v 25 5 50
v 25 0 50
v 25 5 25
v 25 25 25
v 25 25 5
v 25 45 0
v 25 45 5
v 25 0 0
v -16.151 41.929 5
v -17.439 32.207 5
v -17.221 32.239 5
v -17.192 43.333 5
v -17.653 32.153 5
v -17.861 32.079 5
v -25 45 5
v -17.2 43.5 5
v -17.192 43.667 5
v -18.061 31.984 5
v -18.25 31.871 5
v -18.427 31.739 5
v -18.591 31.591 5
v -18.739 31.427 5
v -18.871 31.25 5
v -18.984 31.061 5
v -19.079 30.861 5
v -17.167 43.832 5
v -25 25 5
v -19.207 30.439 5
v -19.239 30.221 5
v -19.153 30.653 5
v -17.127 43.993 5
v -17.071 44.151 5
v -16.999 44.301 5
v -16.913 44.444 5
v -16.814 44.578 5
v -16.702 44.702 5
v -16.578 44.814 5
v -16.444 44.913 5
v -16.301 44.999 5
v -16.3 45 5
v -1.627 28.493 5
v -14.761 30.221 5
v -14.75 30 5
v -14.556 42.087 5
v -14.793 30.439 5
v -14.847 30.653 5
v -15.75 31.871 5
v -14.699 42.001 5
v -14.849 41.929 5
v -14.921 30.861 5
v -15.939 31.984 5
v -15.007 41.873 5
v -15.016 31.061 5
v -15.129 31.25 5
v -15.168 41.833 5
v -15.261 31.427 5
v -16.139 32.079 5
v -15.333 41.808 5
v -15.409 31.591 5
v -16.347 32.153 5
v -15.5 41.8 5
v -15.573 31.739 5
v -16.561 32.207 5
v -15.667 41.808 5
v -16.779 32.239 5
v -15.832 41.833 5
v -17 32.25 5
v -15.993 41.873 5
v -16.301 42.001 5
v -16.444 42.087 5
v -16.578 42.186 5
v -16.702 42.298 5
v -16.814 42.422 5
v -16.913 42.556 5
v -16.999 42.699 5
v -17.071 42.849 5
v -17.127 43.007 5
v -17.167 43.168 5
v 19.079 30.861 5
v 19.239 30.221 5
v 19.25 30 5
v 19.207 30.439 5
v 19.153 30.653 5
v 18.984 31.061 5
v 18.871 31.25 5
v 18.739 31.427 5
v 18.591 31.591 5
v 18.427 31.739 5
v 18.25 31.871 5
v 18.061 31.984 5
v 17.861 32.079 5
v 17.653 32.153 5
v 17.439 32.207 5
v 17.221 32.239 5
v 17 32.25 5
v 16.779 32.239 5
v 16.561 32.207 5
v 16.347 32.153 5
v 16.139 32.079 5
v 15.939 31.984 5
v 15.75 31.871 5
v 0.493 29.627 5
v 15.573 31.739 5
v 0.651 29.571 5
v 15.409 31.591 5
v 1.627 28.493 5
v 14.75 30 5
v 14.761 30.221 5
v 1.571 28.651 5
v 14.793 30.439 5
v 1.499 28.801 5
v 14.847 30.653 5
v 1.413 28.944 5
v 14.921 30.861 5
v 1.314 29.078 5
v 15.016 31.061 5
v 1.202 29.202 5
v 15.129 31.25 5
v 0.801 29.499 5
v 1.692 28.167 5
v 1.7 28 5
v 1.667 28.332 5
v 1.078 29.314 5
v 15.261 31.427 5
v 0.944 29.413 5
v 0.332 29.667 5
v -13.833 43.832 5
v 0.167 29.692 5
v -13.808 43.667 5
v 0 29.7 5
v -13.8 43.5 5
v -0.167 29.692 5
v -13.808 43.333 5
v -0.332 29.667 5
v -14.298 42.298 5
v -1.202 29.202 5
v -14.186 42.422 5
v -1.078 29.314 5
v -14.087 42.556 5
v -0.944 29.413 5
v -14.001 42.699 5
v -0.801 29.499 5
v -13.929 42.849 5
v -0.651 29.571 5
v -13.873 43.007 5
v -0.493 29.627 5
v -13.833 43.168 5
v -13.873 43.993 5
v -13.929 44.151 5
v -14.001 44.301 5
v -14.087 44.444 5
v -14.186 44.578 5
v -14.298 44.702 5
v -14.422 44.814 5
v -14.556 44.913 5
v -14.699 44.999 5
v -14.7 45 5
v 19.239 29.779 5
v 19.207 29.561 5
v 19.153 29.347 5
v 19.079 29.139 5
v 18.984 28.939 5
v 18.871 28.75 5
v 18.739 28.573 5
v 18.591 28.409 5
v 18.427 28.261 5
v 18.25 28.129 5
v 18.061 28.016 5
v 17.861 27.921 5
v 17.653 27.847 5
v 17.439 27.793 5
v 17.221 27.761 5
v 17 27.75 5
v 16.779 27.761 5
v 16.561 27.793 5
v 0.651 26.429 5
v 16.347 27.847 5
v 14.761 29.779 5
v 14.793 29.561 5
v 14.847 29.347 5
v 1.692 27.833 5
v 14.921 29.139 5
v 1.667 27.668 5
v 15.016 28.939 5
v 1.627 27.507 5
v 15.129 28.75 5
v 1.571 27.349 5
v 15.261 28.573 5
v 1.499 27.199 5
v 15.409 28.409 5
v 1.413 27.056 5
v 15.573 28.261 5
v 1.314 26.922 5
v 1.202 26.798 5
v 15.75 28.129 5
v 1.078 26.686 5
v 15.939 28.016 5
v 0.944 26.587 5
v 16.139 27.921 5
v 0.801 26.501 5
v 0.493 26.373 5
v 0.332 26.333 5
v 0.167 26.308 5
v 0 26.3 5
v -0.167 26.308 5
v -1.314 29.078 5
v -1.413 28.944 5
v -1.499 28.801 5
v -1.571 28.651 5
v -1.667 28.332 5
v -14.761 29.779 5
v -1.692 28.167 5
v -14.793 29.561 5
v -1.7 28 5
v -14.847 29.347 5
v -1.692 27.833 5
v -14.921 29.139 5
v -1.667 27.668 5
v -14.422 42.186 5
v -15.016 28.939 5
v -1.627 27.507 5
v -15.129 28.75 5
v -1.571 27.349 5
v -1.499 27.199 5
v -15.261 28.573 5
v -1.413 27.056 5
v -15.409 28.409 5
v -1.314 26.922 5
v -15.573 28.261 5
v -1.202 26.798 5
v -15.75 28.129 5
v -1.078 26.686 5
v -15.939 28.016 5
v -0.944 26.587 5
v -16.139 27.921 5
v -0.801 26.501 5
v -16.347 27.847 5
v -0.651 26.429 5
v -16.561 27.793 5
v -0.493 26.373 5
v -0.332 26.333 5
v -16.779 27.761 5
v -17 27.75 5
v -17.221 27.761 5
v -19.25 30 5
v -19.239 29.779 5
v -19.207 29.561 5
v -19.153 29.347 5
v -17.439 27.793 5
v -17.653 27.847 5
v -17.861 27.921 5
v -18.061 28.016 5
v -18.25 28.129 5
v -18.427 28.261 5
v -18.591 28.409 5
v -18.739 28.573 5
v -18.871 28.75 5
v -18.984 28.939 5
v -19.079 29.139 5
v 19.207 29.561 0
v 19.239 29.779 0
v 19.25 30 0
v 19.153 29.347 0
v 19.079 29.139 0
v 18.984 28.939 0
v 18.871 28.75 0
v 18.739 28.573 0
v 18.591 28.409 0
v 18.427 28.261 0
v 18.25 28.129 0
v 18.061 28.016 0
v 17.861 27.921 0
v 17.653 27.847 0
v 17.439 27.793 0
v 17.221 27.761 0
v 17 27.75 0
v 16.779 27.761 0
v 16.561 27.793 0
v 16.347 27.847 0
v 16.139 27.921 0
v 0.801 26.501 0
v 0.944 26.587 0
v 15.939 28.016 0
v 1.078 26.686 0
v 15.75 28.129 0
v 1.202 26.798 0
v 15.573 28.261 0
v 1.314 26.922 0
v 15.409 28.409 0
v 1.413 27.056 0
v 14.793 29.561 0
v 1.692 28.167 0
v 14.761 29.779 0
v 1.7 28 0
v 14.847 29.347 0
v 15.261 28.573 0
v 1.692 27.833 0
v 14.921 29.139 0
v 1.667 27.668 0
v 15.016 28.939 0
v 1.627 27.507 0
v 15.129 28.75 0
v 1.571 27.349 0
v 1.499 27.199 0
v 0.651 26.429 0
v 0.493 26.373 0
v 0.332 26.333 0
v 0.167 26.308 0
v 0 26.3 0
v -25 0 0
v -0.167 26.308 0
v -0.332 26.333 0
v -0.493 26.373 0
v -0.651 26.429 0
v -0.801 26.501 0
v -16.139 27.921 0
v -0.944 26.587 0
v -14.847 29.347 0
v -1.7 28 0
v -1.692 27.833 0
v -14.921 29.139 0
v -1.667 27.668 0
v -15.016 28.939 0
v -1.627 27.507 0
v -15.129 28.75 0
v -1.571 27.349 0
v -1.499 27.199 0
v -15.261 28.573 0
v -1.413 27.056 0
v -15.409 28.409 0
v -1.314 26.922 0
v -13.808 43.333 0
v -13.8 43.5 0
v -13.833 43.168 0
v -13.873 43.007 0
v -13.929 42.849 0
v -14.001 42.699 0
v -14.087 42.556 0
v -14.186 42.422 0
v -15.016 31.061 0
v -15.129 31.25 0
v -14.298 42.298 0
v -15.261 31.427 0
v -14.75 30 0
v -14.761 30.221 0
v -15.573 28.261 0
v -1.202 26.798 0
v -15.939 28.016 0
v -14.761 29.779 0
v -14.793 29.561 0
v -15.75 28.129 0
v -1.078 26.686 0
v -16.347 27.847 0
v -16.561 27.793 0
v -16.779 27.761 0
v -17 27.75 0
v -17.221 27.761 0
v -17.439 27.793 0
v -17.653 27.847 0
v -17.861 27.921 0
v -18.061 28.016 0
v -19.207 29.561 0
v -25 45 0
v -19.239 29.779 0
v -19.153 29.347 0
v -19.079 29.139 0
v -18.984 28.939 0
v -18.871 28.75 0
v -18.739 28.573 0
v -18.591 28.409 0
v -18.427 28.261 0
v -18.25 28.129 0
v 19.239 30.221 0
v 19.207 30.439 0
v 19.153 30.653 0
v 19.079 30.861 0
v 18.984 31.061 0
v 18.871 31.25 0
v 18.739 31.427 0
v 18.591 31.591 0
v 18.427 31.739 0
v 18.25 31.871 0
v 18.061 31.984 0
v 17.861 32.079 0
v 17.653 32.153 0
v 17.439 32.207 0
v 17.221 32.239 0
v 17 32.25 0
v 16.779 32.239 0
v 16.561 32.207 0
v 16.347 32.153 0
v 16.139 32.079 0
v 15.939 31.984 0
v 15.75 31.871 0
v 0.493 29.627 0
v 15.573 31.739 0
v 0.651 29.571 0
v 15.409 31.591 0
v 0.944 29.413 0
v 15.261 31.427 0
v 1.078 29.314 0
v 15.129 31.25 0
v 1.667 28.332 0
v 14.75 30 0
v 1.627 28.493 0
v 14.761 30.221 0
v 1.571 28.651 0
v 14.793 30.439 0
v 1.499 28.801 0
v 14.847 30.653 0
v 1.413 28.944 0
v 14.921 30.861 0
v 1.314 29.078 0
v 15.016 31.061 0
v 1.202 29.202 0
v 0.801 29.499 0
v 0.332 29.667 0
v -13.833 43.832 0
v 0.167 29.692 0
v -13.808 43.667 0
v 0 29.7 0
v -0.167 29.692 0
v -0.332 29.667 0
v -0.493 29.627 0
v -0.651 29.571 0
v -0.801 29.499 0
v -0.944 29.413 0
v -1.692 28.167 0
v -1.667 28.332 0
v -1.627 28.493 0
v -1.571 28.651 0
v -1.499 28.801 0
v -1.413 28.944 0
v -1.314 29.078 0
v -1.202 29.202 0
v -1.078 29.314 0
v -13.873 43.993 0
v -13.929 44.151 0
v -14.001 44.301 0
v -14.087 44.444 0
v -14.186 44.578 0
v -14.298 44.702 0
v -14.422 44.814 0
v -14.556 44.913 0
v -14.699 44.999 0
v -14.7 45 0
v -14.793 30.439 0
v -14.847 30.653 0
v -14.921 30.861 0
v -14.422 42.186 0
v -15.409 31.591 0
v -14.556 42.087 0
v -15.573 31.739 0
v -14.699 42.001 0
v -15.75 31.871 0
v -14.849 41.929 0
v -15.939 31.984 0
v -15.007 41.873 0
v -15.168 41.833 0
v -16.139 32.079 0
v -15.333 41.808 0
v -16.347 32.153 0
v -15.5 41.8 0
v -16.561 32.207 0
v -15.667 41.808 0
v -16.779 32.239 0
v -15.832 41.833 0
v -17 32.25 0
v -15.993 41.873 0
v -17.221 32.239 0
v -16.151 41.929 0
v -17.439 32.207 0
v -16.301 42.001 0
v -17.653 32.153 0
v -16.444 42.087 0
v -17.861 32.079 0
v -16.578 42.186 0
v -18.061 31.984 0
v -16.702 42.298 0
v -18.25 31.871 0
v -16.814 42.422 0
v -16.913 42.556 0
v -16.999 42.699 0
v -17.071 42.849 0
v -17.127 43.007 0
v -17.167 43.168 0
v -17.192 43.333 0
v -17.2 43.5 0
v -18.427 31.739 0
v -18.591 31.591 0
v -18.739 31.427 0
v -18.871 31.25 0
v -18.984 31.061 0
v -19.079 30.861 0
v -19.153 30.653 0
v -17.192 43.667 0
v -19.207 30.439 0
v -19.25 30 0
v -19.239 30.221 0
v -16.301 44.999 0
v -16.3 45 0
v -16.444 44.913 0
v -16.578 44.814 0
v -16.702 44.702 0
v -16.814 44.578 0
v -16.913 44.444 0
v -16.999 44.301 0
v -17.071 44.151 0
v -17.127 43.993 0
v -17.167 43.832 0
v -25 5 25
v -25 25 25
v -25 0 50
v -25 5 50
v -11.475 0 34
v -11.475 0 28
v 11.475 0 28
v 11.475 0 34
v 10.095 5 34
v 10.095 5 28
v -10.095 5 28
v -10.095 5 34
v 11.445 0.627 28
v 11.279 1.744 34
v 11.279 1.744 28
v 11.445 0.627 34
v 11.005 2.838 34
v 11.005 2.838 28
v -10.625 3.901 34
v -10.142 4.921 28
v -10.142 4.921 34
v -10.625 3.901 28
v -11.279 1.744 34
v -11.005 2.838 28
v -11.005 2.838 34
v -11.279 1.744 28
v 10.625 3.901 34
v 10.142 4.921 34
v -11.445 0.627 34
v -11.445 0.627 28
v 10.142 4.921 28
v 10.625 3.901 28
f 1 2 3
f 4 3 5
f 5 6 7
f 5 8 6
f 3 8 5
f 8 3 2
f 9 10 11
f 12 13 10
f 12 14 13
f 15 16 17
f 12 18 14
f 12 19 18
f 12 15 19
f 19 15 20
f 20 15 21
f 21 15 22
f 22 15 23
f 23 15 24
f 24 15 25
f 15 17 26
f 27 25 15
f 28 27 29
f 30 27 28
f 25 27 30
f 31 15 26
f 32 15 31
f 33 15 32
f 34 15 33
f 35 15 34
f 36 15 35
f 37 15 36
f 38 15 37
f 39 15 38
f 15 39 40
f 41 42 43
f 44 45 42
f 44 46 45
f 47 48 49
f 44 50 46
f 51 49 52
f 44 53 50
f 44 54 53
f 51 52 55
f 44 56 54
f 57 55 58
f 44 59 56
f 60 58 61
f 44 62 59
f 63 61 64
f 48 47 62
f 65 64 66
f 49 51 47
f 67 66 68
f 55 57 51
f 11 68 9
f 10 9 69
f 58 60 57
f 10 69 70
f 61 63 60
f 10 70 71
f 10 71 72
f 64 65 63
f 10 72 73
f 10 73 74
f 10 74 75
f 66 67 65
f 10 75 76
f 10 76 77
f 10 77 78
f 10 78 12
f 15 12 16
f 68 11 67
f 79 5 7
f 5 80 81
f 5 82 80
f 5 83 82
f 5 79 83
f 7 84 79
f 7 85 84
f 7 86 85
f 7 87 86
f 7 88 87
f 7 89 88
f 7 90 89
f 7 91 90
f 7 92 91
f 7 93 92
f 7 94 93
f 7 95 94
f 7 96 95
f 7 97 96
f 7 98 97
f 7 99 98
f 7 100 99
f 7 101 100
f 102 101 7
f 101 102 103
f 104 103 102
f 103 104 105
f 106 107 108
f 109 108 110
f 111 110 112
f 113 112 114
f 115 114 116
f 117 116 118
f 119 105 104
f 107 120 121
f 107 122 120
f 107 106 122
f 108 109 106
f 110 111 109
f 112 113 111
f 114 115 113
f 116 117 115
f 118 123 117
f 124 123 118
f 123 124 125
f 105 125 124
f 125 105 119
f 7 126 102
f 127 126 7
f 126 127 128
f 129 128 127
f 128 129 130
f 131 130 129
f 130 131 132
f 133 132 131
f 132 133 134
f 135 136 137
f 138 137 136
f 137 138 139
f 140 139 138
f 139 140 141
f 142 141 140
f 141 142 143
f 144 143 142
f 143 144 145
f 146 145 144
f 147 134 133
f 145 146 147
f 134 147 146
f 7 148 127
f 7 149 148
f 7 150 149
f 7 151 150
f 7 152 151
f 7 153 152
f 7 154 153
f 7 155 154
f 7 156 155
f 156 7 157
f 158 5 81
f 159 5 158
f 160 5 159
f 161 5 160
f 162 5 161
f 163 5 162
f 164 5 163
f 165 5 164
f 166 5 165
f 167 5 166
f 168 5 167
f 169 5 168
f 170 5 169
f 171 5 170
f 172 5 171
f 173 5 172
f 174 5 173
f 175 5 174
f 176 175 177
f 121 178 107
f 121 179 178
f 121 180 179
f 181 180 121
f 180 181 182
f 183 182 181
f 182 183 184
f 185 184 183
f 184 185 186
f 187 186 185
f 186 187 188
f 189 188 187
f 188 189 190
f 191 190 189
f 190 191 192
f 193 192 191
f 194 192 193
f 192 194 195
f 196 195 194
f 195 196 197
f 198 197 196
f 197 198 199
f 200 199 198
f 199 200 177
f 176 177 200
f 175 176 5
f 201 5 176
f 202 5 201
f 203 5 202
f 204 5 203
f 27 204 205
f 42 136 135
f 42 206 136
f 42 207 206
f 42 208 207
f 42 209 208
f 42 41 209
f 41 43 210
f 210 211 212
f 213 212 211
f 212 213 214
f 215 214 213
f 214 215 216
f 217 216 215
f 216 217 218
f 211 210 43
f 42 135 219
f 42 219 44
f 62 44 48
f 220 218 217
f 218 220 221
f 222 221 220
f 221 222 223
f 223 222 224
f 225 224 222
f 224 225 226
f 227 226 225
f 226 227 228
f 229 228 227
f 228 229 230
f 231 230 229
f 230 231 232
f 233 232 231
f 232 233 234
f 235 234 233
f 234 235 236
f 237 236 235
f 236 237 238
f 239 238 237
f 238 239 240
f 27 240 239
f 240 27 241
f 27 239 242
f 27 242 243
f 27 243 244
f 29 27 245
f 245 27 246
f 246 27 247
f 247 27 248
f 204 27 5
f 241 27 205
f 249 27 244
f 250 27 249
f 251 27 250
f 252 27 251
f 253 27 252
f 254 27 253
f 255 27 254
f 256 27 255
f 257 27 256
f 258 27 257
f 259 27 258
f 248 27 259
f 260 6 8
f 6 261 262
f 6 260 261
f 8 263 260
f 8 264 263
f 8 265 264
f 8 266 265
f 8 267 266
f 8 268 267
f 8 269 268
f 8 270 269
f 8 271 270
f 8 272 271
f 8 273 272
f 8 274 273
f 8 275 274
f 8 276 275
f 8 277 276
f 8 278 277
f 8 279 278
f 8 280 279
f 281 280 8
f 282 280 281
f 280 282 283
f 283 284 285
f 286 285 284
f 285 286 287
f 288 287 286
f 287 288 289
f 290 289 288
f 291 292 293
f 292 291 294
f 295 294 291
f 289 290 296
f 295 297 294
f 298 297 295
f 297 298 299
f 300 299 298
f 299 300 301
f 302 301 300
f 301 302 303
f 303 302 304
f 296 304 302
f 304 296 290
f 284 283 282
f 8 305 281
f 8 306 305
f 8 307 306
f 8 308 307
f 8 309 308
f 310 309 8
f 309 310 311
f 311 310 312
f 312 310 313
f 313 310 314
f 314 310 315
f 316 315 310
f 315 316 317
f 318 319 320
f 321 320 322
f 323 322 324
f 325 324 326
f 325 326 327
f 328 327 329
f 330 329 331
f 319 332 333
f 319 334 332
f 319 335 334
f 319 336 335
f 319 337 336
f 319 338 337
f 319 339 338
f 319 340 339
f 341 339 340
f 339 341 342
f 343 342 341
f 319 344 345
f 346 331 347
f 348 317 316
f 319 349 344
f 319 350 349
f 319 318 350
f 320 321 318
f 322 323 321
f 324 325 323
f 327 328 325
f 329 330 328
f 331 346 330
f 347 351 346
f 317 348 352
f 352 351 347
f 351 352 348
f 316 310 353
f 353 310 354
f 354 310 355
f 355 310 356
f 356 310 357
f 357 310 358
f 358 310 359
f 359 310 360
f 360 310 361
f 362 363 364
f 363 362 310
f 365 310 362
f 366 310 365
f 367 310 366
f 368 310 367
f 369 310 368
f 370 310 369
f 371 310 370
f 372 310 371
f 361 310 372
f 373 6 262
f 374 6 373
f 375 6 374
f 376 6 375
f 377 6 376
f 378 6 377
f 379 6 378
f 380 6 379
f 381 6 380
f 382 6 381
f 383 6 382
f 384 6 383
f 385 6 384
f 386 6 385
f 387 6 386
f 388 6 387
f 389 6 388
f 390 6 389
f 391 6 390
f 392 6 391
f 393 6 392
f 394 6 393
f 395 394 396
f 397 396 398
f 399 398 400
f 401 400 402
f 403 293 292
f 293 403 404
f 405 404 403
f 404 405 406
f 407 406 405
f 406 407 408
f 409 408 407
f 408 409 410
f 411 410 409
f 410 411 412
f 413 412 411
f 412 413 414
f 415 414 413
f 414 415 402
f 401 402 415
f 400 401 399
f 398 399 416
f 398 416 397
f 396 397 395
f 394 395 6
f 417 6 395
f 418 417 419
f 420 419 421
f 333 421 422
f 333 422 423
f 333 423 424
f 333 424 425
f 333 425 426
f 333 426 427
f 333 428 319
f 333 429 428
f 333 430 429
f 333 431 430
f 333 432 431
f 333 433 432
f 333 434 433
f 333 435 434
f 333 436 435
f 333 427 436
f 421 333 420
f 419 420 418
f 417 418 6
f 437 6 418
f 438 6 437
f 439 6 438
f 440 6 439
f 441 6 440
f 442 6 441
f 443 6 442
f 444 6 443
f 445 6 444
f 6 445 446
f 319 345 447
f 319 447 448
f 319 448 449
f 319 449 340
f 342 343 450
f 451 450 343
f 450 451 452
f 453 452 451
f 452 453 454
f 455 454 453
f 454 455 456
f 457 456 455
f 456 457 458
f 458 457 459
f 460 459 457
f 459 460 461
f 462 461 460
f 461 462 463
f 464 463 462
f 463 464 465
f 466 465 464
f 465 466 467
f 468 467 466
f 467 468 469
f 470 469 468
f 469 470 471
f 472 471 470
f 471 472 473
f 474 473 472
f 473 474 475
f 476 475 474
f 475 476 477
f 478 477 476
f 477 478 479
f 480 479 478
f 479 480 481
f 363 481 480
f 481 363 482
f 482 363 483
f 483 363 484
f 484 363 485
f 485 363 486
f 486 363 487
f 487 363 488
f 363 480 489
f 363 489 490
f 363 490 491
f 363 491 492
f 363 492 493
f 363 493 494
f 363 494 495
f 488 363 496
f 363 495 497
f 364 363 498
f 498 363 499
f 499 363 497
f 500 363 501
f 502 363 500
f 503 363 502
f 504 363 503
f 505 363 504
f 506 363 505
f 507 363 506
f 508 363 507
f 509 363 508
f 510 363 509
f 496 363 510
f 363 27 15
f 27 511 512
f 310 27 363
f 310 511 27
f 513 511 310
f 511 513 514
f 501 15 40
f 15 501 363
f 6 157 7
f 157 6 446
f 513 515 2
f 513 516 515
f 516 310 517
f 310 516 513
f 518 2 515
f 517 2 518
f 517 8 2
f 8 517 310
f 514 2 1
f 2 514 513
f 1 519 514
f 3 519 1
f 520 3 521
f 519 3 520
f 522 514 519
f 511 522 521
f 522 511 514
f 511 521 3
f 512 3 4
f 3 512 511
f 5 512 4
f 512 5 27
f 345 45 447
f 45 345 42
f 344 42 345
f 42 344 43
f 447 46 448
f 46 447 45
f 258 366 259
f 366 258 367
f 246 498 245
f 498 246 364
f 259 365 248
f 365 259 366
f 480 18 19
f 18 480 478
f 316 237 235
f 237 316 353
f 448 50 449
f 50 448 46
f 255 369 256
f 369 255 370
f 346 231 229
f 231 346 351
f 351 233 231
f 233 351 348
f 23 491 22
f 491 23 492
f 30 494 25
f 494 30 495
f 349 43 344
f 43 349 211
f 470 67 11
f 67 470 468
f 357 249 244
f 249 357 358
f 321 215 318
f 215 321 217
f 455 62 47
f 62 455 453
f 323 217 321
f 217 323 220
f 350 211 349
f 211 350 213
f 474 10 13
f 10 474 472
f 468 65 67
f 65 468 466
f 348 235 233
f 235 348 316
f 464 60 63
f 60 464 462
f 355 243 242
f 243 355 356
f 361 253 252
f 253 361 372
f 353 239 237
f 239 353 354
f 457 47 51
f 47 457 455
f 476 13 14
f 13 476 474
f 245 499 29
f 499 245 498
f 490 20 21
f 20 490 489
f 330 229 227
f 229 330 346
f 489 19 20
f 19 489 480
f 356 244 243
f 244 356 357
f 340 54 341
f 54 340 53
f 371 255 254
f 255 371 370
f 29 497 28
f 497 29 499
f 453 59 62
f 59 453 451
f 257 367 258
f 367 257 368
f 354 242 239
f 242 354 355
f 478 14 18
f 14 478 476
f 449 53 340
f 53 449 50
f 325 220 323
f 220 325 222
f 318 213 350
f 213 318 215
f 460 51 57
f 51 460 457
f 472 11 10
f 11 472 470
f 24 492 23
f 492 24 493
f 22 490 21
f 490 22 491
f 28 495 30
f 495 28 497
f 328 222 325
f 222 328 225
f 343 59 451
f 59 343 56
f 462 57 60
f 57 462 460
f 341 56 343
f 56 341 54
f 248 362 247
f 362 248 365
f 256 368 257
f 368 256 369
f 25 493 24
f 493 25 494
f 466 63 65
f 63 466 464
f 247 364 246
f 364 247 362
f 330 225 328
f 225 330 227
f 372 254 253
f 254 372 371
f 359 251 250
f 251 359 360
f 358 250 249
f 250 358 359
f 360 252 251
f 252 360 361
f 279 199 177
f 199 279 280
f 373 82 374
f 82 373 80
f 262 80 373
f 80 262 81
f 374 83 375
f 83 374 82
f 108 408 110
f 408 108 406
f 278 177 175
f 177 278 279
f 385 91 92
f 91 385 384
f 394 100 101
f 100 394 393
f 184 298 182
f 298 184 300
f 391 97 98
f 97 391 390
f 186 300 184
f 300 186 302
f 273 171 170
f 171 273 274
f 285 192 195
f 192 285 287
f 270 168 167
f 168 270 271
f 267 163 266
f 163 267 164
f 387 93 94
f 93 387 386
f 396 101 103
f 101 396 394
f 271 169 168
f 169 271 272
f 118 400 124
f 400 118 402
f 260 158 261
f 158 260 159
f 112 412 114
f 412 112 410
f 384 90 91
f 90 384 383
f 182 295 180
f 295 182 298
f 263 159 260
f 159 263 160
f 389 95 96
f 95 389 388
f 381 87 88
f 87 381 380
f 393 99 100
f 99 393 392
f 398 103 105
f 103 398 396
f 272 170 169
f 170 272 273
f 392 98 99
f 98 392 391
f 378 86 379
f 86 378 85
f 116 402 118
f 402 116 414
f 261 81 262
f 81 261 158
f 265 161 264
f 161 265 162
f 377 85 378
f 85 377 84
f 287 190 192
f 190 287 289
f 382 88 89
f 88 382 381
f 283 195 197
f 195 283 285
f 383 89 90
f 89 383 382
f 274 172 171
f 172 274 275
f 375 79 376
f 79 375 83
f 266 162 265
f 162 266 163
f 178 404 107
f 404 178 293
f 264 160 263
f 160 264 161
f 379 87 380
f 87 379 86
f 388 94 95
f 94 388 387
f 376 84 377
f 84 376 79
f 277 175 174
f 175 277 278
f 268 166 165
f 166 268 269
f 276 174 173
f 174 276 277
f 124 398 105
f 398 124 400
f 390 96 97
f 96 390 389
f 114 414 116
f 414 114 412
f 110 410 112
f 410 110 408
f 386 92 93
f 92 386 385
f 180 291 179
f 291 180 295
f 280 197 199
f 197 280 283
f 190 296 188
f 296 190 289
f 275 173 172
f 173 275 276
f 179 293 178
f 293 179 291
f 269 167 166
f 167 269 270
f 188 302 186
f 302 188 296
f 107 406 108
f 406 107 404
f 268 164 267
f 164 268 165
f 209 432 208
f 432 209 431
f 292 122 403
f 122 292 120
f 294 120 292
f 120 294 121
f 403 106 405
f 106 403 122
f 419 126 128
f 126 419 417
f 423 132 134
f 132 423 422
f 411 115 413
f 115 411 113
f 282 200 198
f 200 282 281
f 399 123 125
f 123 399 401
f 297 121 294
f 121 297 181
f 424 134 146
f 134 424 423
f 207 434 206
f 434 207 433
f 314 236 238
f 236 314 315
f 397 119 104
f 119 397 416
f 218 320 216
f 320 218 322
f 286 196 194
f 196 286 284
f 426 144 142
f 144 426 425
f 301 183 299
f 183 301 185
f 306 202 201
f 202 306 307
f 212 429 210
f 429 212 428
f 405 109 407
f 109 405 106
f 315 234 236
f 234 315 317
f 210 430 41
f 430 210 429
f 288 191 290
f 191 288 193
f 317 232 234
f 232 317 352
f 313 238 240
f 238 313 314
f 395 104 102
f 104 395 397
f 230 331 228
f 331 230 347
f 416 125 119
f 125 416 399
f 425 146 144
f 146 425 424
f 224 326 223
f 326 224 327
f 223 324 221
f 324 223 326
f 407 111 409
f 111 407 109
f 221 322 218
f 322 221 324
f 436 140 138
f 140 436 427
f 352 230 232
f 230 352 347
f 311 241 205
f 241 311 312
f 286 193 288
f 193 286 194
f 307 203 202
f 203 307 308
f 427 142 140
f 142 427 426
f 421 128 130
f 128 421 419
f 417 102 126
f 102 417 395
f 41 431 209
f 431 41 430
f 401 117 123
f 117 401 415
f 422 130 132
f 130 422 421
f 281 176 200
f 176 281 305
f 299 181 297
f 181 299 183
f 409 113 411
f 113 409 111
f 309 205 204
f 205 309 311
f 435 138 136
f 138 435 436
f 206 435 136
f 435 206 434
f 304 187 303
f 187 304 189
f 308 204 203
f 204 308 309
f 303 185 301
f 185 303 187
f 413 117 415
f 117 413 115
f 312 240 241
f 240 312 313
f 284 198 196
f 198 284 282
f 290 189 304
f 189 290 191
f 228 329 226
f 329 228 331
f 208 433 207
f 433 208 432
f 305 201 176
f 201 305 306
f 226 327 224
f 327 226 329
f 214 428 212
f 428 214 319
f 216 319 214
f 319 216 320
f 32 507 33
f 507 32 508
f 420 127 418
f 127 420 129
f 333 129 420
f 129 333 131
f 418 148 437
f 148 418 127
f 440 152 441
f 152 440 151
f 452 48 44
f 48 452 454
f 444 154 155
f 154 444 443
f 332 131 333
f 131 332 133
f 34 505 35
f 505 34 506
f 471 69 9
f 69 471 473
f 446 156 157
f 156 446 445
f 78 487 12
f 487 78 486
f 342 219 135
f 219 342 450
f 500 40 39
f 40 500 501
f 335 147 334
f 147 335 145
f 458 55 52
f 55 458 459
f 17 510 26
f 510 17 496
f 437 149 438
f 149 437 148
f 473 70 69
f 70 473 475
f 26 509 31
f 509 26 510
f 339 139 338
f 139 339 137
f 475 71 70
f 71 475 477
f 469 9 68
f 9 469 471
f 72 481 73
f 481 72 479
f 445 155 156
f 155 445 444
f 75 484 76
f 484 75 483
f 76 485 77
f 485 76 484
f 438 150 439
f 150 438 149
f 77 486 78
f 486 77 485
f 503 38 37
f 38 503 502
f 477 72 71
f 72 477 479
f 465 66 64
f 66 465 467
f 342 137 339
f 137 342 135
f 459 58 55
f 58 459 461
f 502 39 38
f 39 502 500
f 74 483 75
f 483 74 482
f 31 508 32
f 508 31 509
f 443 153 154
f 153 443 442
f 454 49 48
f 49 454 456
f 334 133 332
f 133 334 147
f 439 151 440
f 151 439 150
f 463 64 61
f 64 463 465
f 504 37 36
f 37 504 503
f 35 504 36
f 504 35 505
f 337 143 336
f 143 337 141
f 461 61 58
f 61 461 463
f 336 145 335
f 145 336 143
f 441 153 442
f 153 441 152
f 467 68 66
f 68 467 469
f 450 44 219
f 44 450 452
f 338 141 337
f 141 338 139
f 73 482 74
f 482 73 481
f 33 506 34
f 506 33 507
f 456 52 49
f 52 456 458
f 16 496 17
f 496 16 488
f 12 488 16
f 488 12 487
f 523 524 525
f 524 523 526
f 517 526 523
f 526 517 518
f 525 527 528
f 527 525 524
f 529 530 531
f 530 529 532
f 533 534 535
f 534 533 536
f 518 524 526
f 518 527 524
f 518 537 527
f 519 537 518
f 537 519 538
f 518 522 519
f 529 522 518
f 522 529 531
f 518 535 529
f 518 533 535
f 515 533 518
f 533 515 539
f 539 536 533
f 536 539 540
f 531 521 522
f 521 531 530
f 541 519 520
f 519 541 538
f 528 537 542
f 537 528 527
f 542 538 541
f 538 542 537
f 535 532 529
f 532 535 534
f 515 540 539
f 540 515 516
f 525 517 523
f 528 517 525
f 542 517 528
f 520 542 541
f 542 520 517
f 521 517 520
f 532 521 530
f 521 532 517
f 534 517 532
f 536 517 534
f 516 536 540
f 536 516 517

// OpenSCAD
// L-shaped mounting bracket for a NEMA 17 stepper motor (e.g. syringe pump)
// Print orientation: base plate lies on the bed (z = 0), vertical plate builds up along +Z

$fn = 64;

// ---------- Base plate ----------
base_x_min   = -25;   // base plate X start
base_x_max   = 25;    // base plate X end
base_y_min   = 0;     // base plate Y start
base_y_max   = 45;    // base plate Y end
base_thick   = 5;     // base plate thickness (Z)

// ---------- Vertical motor plate ----------
vert_x_min   = -25;   // motor plate X start
vert_x_max   = 25;    // motor plate X end
vert_y_min   = 0;     // motor plate Y start
vert_y_max   = 5;     // motor plate Y end (thickness)
vert_height  = 50;    // motor plate height (Z)

// ---------- Boss hole ----------
boss_d       = 23;    // motor centring boss hole diameter
boss_x       = 0;     // boss hole X centre
boss_z       = 28;    // boss hole Z centre

// ---------- Screw holes ----------
screw_d      = 3.4;   // M3 screw hole diameter
screw_pitch  = 31;    // square pattern pitch (X and Y)
screw_n      = 4;     // number of screw holes

// ---------- Gussets ----------
gusset_x1    = -25;   // left gusset X start
gusset_x2    = -20;   // left gusset X end
gusset_y     = 20;    // gusset leg length along +Y
gusset_z     = 20;    // gusset leg length along +Z

// ---------- Fasteners ----------
hole_d_m4    = 4.5;   // M4 hole diameter
hole_n       = 2;     // number of M4 holes
hole_x       = [-17, 17]; // M4 hole X positions
hole_y       = 30;    // M4 hole Y position

// ---------- Misc ----------
eps          = 0.5;   // cutter overshoot past faces

difference() {
    union() {
        // Base plate
        translate([base_x_min, base_y_min, 0])
            cube([base_x_max - base_x_min, base_y_max - base_y_min, base_thick]);

        // Vertical motor plate
        translate([vert_x_min, vert_y_min, 0])
            cube([vert_x_max - vert_x_min, vert_y_max - vert_y_min, vert_height]);

        // Left gusset (right-angle corner at y = 5, z = 5)
        translate([gusset_x1, 5, 5])
            cube([gusset_x2 - gusset_x1, gusset_y, gusset_z]);

        // Right gusset (right-angle corner at y = 5, z = 5)
        translate([gusset_x2, 5, 5])
            cube([25 - gusset_x2, gusset_y, gusset_z]);
    }

    // M4 vertical through-holes in base plate
    for (x = hole_x)
        translate([x, hole_y, -eps])
            cylinder(d = hole_d_m4, h = base_thick + 2 * eps);

    // Boss hole through motor plate (along Y)
    translate([boss_x, vert_y_min - eps, boss_z])
        cylinder(d = boss_d, h = (vert_y_max - vert_y_min) + 2 * eps);

    // M3 screw holes on square pattern, centred on boss hole
    for (i = [0 : screw_n - 1])
        translate([
            boss_x + (-1) * (i % 2) * screw_pitch / 2,
            boss_z + (i / 2) * screw_pitch,
            vert_y_min - eps
        ])
            cylinder(d = screw_d, h = (vert_y_max - vert_y_min) + 2 * eps);
}
